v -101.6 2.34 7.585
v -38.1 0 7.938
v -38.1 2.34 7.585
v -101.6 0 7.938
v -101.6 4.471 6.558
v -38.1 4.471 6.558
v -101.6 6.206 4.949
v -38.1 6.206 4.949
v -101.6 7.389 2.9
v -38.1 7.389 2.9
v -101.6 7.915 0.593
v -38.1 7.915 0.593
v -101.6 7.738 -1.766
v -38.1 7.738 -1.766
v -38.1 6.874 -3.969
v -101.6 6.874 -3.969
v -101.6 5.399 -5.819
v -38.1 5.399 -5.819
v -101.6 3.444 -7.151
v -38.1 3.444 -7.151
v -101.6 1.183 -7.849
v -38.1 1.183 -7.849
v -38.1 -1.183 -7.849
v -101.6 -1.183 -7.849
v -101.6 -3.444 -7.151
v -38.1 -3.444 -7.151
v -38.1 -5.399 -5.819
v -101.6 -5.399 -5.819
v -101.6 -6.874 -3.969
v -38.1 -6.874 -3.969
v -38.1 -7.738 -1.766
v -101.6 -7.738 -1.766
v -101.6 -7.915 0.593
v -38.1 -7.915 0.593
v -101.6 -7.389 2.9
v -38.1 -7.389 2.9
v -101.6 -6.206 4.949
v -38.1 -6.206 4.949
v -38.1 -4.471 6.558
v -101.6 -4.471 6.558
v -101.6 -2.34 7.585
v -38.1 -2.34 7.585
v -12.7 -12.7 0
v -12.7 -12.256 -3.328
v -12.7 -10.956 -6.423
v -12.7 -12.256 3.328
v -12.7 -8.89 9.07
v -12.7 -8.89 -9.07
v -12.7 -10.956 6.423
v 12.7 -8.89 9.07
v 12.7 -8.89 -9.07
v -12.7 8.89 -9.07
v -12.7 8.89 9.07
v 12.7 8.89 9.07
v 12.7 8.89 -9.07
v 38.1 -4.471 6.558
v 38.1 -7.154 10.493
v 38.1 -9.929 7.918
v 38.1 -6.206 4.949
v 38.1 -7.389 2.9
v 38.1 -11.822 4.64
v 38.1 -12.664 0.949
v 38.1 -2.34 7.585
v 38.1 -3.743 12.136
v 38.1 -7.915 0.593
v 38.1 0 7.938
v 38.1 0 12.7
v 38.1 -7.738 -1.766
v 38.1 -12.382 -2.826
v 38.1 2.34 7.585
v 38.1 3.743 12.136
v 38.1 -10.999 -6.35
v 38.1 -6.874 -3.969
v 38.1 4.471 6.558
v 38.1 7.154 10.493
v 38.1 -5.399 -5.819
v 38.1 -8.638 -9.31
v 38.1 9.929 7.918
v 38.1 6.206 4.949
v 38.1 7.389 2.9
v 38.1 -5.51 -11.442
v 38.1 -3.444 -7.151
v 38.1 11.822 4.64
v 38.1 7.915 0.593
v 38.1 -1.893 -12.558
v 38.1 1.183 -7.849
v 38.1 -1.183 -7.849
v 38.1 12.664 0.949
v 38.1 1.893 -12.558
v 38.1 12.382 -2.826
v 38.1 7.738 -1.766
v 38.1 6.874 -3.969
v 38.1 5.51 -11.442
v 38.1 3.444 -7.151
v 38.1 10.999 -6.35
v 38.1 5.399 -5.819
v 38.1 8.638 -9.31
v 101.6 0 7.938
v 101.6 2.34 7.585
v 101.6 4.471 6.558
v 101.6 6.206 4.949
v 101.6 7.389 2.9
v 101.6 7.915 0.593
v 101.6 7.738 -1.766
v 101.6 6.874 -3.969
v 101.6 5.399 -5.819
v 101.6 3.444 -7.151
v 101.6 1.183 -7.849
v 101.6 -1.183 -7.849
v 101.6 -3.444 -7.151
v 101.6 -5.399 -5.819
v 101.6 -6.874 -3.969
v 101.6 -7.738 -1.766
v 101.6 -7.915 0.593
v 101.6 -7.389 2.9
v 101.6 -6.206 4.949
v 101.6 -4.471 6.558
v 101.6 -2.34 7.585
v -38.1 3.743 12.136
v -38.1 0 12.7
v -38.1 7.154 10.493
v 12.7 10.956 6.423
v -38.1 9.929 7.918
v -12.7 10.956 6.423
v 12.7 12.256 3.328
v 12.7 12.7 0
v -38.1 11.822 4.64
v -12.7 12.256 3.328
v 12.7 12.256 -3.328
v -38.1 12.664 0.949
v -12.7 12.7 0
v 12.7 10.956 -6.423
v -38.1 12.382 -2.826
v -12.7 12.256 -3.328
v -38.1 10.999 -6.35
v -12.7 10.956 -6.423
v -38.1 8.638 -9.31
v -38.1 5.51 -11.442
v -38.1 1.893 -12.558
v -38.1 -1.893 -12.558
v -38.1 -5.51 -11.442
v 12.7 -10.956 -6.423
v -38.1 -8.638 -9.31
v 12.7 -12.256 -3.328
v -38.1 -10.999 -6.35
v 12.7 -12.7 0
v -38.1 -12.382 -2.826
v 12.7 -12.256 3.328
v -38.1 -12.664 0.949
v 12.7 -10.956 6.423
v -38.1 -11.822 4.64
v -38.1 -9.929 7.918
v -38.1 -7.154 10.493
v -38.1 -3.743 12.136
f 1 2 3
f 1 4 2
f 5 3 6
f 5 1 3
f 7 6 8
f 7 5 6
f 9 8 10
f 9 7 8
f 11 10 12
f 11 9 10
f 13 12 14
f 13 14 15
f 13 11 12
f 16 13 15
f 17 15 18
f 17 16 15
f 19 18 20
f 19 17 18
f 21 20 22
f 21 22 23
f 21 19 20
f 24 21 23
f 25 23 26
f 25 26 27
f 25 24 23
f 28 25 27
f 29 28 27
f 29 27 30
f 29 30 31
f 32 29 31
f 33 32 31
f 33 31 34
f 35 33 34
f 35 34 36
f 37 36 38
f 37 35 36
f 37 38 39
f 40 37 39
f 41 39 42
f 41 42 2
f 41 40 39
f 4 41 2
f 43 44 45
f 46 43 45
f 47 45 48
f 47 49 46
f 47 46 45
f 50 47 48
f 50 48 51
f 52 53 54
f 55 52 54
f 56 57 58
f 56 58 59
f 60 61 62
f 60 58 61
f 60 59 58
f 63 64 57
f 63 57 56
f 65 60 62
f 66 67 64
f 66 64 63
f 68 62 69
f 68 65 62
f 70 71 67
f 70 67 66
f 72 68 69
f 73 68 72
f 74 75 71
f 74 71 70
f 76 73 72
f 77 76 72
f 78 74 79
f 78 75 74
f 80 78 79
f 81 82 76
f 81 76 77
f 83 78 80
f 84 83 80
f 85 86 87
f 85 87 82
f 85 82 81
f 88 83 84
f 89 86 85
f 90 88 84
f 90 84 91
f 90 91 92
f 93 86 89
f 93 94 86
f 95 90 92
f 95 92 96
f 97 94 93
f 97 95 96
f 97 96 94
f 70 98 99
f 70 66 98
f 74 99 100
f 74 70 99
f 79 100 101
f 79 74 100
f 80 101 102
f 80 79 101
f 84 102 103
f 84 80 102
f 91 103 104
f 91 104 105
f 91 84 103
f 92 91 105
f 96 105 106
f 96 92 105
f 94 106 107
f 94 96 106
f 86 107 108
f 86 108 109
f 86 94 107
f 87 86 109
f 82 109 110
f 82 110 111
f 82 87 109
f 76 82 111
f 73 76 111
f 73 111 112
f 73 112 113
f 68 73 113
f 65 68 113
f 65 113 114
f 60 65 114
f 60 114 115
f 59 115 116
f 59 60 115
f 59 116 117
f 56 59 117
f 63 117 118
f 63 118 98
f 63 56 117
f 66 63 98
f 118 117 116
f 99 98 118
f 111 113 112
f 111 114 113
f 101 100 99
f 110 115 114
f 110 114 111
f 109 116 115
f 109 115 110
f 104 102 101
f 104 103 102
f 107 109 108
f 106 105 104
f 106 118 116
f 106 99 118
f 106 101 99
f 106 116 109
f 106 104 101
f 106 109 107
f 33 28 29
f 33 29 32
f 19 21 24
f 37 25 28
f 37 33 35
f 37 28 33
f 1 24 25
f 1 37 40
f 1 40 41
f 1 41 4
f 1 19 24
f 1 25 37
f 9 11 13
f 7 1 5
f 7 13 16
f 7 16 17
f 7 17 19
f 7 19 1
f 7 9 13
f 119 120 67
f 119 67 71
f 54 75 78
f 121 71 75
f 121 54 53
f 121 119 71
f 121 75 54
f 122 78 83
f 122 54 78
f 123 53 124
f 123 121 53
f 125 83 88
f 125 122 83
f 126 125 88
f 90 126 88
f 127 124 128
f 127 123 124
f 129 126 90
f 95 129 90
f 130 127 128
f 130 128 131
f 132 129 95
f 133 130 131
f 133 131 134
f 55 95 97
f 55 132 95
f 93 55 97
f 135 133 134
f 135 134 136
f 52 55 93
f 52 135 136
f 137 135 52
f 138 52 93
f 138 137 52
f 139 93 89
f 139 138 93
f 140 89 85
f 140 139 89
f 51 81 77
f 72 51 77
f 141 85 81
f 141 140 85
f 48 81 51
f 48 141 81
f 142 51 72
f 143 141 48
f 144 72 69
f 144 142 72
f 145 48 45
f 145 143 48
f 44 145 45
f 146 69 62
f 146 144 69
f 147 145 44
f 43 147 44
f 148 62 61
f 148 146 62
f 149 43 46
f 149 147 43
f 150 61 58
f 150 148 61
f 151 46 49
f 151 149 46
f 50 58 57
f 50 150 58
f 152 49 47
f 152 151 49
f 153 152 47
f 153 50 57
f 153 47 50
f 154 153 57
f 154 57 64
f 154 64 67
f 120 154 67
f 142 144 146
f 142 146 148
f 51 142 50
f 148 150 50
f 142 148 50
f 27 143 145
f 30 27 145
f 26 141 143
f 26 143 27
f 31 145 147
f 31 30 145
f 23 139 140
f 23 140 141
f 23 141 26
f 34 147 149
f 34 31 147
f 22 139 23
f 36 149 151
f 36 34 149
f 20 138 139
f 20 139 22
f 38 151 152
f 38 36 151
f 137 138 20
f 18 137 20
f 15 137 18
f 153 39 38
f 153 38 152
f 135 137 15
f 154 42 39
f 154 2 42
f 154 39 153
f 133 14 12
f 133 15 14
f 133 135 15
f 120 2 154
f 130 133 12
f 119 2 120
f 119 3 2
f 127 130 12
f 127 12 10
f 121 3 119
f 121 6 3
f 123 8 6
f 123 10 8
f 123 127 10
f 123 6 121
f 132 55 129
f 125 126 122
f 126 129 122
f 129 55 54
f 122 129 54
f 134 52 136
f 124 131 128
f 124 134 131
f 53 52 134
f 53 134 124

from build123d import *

# Parameters (mm, degrees)
F3_W     = 25.4
F3_H     = 7.62
F4_DEPTH = 25.4


with BuildPart() as f1:
    # F0 (on Front) → F1 (revolve)
    with BuildSketch(Plane.XZ):
        Polygon((-101.6, 7.9375), (-101.6, 0), (101.6, 0), (101.6, 7.9375), (38.1, 7.9375), (38.1, 12.7), (-38.1, 12.7), (-38.1, 7.9375), align=None)
    revolve(axis=Axis((0, 0, 0), (-1, 0, 0)))

    # F3 (on offset) → F4 (cut)
    with BuildSketch(Plane.XY.offset(12.7)):
        with Locations((0, 12.7)):
            Rectangle(F3_W, F3_H)
        with Locations((0, -12.7)):
            Rectangle(F3_W, F3_H)
    extrude(amount=-F4_DEPTH, mode=Mode.SUBTRACT)


solid = f1.part
